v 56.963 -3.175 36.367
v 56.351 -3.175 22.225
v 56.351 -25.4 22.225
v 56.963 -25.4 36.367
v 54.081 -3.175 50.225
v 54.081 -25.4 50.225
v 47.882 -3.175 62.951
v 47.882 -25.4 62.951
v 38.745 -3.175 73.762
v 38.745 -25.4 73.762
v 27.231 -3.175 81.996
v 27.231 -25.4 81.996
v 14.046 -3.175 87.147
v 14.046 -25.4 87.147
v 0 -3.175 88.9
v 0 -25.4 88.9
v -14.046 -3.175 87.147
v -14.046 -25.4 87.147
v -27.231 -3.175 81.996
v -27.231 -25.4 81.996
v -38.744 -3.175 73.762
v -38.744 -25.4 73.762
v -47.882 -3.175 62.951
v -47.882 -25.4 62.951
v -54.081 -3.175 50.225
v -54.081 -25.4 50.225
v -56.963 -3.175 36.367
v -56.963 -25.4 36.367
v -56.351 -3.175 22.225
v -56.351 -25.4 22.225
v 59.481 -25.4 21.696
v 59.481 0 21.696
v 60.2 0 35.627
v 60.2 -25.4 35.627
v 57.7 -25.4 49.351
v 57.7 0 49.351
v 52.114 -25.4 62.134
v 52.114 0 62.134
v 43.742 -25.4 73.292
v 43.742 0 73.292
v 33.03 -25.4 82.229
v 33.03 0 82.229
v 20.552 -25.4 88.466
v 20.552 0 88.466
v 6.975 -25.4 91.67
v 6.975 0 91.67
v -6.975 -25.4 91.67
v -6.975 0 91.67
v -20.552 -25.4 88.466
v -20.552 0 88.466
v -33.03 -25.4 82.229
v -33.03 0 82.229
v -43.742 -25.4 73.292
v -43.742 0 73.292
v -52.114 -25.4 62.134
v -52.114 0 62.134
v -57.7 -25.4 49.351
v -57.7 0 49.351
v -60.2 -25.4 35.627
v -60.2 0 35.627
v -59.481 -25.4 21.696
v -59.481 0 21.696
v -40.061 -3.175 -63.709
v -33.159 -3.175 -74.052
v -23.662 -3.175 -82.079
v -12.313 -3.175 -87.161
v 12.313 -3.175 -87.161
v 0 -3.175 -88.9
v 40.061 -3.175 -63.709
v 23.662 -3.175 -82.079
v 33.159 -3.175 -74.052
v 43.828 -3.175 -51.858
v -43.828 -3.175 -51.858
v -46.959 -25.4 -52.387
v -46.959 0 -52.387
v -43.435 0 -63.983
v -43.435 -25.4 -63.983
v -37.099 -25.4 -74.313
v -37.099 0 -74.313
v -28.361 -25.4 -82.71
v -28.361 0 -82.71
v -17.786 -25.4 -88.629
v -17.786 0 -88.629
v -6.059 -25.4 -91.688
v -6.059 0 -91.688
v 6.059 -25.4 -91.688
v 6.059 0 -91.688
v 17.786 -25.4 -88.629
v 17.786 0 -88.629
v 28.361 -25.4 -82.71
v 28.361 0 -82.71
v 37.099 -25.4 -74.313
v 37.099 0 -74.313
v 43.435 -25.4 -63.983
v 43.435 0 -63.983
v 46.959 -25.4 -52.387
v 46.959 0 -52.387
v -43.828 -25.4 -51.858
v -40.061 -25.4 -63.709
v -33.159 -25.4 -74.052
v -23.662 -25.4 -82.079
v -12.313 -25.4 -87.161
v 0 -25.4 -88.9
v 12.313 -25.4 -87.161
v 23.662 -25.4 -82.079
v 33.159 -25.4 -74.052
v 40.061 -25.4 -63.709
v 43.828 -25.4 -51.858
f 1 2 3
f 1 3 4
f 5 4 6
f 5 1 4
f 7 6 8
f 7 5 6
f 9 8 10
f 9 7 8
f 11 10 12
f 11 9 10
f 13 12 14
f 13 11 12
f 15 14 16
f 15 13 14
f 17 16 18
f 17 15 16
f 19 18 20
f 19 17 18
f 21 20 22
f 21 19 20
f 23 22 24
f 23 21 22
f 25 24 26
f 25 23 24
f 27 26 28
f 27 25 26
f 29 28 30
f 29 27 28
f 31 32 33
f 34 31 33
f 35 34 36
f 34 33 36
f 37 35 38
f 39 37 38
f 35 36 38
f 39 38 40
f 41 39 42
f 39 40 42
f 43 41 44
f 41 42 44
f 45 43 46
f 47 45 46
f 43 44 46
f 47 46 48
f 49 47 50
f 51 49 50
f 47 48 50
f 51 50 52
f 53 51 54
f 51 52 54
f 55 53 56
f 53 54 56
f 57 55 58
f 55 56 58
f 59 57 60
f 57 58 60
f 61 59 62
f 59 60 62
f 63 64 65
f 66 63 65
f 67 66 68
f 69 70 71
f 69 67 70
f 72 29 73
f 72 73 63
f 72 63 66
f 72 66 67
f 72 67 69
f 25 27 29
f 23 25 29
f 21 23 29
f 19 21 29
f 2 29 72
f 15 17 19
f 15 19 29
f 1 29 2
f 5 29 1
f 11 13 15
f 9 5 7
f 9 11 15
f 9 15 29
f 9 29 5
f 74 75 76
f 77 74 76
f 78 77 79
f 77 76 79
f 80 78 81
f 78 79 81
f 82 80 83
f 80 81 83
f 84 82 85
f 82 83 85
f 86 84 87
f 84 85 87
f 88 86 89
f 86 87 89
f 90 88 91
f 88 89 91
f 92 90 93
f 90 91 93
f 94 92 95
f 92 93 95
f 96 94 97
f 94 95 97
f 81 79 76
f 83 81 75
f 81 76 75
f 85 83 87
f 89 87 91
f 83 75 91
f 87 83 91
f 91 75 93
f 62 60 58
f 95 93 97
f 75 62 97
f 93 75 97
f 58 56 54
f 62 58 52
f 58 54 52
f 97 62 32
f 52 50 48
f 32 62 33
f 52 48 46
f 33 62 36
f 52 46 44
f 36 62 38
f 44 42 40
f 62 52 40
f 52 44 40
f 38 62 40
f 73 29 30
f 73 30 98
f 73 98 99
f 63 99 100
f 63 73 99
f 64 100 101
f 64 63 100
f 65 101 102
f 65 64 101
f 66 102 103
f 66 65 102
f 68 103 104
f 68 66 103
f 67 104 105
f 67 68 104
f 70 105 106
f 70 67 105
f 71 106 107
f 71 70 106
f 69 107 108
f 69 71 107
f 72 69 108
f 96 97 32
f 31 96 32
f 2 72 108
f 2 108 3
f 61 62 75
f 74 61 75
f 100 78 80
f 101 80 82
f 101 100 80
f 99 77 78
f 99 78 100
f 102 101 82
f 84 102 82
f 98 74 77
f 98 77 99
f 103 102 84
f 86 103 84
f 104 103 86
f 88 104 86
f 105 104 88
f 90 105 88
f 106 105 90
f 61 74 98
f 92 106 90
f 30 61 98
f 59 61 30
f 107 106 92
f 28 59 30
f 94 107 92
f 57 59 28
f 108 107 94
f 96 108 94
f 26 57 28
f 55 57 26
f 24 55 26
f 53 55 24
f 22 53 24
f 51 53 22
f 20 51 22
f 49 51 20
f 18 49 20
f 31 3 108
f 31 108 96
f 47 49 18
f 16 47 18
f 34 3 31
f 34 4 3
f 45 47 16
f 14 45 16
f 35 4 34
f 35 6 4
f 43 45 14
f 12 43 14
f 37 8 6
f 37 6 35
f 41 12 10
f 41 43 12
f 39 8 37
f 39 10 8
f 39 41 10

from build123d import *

# Parameters (mm, degrees)
F1_DEPTH = 25.4
F2_T     = -3.175


# Not quite as in the source:
# - ends of sketch curves that miss each other by under 0.0002 mm in the source are joined


with BuildPart() as f1:
    # F0 (on Front) → F1 (new body)
    with BuildSketch(Plane.XZ):
        with BuildLine():
            ThreePointArc((-46.9588833262, -52.3874997171), (0, -92.075), (46.9588833262, -52.3874997171))
            Line((46.9588833262, -52.3874997171), (59.4812628, 21.6958164))
            ThreePointArc((59.4812628, 21.6958164), (0, 92.075), (-59.4812496656, 21.6958186201))
            Line((-59.4812496656, 21.6958186201), (-46.9588833262, -52.3874997171))
        make_face()
    extrude(amount=F1_DEPTH)

    # F2
    f2_openings = [f1.faces().sort_by_distance(p)[0] for p in [
        (4e-06, -25.4, 3.213538),
    ]]
    offset(amount=F2_T, openings=f2_openings, kind=Kind.INTERSECTION)


solid = f1.part
